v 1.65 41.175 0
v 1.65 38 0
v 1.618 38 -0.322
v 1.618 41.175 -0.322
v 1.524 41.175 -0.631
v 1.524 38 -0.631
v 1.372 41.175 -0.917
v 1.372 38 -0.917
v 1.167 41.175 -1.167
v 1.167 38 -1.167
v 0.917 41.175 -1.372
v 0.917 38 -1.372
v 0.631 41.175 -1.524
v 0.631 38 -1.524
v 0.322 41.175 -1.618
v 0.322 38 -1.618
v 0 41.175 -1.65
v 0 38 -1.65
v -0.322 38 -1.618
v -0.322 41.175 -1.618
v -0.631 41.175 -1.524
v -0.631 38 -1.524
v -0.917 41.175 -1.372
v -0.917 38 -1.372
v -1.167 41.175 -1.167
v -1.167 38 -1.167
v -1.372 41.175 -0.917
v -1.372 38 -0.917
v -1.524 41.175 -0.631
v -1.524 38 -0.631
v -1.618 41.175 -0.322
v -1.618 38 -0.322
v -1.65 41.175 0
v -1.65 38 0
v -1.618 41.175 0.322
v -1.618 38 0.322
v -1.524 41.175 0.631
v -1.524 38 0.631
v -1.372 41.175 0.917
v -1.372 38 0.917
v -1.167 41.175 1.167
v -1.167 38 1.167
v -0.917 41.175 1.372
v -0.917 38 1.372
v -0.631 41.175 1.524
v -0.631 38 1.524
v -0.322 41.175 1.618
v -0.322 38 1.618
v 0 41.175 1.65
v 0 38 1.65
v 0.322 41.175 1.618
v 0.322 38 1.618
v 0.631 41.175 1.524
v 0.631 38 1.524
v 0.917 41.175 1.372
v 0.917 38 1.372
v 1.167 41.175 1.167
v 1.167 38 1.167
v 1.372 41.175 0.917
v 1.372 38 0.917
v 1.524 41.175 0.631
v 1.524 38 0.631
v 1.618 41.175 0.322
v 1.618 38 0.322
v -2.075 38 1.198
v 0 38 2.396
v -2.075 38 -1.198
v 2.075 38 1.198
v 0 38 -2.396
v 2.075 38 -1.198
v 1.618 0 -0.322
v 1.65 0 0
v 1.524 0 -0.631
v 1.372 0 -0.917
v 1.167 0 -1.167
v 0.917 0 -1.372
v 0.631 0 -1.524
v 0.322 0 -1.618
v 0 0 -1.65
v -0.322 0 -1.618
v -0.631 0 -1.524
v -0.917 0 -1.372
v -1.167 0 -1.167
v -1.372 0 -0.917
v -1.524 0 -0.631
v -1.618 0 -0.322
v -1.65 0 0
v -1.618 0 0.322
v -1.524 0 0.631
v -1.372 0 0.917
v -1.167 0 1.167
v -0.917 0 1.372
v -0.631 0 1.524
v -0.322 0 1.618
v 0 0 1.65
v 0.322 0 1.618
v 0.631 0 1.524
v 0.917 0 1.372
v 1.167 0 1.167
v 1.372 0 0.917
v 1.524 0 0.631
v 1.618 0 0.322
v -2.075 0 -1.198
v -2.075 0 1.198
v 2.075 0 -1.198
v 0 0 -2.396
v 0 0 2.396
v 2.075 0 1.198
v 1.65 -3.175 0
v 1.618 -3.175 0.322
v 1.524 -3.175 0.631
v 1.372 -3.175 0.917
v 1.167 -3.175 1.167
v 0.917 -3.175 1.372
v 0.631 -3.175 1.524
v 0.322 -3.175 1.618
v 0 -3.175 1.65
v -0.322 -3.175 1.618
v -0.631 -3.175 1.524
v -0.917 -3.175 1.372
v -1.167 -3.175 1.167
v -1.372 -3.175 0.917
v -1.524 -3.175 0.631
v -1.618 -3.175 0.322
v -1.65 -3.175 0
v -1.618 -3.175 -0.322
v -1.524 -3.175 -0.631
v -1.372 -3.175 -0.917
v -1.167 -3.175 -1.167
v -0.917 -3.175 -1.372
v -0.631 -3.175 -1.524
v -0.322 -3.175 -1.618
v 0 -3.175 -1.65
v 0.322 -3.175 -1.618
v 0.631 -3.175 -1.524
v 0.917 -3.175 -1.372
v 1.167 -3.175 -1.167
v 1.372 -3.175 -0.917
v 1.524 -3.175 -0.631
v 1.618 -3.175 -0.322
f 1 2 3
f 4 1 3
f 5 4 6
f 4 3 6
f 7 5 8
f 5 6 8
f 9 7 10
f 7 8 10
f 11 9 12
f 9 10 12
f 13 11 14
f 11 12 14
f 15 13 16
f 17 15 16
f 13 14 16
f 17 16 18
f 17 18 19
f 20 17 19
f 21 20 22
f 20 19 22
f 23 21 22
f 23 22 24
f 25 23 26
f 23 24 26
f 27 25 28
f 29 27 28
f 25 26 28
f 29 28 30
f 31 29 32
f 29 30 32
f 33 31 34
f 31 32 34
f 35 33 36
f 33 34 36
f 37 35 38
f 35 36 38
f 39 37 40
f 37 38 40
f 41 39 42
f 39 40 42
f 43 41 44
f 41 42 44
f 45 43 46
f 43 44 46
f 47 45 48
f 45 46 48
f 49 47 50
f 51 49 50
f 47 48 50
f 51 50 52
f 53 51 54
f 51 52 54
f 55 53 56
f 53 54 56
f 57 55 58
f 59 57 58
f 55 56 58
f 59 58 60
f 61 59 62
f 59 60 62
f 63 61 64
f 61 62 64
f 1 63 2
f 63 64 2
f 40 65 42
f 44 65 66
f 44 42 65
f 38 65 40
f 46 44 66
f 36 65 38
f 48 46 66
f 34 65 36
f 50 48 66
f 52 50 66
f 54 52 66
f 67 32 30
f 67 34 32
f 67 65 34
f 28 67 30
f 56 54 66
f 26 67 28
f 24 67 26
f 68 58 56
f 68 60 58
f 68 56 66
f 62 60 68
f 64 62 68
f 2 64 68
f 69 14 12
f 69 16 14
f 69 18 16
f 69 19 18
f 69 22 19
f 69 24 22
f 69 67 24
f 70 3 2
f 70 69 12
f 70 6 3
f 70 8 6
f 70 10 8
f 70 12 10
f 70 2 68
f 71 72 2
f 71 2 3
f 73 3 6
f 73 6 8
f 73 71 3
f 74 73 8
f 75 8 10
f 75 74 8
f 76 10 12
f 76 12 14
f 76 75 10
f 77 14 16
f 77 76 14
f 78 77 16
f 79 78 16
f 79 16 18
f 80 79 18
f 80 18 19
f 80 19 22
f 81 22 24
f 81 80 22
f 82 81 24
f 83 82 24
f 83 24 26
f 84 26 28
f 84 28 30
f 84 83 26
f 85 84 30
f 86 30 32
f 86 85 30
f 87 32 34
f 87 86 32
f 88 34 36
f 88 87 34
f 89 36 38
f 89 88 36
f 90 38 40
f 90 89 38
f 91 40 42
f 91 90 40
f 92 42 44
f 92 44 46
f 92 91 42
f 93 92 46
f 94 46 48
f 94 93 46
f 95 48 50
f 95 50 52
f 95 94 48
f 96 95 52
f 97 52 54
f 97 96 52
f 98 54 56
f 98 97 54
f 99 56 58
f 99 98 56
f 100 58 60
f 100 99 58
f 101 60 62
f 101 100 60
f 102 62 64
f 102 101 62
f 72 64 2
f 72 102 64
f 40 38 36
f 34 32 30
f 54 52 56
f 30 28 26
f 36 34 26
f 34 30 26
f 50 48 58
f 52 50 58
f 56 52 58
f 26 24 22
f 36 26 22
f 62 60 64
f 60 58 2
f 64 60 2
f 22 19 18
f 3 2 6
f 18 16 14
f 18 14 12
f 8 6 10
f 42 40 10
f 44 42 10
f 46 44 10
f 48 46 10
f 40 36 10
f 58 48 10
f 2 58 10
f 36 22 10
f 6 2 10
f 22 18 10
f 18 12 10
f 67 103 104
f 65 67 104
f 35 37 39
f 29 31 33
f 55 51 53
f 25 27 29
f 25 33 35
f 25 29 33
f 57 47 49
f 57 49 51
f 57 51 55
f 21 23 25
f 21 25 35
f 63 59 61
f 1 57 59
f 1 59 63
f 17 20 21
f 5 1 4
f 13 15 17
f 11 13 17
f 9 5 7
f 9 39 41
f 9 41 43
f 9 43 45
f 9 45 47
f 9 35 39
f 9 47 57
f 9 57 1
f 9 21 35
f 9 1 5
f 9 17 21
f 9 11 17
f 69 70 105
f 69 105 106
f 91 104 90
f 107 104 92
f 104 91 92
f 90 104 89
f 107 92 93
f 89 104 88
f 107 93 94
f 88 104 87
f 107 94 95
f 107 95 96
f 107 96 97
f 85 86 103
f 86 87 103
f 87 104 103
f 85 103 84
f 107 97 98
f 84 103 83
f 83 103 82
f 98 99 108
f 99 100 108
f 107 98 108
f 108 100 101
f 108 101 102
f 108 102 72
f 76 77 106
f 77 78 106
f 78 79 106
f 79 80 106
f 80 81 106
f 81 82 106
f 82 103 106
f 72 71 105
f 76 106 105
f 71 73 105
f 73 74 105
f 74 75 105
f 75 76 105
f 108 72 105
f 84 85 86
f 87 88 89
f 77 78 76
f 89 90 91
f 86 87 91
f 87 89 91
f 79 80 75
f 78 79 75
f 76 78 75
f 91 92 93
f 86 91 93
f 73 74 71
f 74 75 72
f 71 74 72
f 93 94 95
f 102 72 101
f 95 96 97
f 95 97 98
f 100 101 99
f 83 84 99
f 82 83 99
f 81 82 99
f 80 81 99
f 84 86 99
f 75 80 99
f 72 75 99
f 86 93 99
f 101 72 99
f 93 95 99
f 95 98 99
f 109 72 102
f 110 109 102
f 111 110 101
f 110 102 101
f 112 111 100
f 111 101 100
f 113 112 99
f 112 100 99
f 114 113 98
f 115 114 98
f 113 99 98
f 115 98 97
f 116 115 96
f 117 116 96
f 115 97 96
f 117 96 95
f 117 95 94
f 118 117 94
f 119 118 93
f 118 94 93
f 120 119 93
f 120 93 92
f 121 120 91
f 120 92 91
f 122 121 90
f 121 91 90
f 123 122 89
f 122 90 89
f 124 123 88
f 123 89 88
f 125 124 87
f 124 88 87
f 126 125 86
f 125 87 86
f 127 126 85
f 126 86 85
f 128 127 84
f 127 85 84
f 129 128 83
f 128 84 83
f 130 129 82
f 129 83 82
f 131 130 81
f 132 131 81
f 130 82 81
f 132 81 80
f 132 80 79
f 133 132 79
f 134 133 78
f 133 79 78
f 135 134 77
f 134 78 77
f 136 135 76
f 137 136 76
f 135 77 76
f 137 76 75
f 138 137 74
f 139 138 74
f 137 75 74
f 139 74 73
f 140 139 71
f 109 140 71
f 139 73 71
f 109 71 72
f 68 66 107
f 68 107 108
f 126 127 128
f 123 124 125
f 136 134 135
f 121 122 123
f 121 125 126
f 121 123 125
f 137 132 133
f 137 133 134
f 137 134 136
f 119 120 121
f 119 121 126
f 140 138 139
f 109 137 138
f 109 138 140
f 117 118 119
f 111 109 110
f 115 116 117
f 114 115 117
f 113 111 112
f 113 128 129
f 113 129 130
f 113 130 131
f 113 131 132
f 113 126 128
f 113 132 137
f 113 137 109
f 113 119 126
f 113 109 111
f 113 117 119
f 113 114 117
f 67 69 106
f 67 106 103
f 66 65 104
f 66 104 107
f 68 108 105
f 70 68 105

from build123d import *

# Parameters (mm, degrees)
SKETCH1_R           = 1.65
BOSS_EXTRUDE1_DEPTH = 38
SKETCH2_R           = 1.65
BOSS_EXTRUDE2_DEPTH = 3.175
SKETCH3_R           = 1.65
BOSS_EXTRUDE3_DEPTH = 3.175


with BuildPart() as part:
    # Sketch1 → Boss-Extrude1 (new body)
    with BuildSketch(Plane(origin=(0, 0, 0), x_dir=(1, 0, 0), z_dir=(0, 1, 0))):
        Polygon((0, -2.396003617), (2.075, -1.198001809), (2.075, 1.198001809), (0, 2.396003617), (-2.075, 1.198001809), (-2.075, -1.198001809), align=None)
        Circle(SKETCH1_R, mode=Mode.SUBTRACT)
    extrude(amount=BOSS_EXTRUDE1_DEPTH)


with BuildPart() as body_2:
    # Sketch2 → Boss-Extrude2 (new body)
    with BuildSketch(Plane.XZ):
        Circle(SKETCH2_R)
    extrude(amount=BOSS_EXTRUDE2_DEPTH)


with BuildPart() as body_3:
    # Sketch3 → Boss-Extrude3 (new body)
    with BuildSketch(Plane(origin=(0, 38, 0), x_dir=(1, 0, 0), z_dir=(0, 1, 0))):
        Circle(SKETCH3_R)
    extrude(amount=BOSS_EXTRUDE3_DEPTH)


solid = Compound([part.part, body_2.part, body_3.part])
